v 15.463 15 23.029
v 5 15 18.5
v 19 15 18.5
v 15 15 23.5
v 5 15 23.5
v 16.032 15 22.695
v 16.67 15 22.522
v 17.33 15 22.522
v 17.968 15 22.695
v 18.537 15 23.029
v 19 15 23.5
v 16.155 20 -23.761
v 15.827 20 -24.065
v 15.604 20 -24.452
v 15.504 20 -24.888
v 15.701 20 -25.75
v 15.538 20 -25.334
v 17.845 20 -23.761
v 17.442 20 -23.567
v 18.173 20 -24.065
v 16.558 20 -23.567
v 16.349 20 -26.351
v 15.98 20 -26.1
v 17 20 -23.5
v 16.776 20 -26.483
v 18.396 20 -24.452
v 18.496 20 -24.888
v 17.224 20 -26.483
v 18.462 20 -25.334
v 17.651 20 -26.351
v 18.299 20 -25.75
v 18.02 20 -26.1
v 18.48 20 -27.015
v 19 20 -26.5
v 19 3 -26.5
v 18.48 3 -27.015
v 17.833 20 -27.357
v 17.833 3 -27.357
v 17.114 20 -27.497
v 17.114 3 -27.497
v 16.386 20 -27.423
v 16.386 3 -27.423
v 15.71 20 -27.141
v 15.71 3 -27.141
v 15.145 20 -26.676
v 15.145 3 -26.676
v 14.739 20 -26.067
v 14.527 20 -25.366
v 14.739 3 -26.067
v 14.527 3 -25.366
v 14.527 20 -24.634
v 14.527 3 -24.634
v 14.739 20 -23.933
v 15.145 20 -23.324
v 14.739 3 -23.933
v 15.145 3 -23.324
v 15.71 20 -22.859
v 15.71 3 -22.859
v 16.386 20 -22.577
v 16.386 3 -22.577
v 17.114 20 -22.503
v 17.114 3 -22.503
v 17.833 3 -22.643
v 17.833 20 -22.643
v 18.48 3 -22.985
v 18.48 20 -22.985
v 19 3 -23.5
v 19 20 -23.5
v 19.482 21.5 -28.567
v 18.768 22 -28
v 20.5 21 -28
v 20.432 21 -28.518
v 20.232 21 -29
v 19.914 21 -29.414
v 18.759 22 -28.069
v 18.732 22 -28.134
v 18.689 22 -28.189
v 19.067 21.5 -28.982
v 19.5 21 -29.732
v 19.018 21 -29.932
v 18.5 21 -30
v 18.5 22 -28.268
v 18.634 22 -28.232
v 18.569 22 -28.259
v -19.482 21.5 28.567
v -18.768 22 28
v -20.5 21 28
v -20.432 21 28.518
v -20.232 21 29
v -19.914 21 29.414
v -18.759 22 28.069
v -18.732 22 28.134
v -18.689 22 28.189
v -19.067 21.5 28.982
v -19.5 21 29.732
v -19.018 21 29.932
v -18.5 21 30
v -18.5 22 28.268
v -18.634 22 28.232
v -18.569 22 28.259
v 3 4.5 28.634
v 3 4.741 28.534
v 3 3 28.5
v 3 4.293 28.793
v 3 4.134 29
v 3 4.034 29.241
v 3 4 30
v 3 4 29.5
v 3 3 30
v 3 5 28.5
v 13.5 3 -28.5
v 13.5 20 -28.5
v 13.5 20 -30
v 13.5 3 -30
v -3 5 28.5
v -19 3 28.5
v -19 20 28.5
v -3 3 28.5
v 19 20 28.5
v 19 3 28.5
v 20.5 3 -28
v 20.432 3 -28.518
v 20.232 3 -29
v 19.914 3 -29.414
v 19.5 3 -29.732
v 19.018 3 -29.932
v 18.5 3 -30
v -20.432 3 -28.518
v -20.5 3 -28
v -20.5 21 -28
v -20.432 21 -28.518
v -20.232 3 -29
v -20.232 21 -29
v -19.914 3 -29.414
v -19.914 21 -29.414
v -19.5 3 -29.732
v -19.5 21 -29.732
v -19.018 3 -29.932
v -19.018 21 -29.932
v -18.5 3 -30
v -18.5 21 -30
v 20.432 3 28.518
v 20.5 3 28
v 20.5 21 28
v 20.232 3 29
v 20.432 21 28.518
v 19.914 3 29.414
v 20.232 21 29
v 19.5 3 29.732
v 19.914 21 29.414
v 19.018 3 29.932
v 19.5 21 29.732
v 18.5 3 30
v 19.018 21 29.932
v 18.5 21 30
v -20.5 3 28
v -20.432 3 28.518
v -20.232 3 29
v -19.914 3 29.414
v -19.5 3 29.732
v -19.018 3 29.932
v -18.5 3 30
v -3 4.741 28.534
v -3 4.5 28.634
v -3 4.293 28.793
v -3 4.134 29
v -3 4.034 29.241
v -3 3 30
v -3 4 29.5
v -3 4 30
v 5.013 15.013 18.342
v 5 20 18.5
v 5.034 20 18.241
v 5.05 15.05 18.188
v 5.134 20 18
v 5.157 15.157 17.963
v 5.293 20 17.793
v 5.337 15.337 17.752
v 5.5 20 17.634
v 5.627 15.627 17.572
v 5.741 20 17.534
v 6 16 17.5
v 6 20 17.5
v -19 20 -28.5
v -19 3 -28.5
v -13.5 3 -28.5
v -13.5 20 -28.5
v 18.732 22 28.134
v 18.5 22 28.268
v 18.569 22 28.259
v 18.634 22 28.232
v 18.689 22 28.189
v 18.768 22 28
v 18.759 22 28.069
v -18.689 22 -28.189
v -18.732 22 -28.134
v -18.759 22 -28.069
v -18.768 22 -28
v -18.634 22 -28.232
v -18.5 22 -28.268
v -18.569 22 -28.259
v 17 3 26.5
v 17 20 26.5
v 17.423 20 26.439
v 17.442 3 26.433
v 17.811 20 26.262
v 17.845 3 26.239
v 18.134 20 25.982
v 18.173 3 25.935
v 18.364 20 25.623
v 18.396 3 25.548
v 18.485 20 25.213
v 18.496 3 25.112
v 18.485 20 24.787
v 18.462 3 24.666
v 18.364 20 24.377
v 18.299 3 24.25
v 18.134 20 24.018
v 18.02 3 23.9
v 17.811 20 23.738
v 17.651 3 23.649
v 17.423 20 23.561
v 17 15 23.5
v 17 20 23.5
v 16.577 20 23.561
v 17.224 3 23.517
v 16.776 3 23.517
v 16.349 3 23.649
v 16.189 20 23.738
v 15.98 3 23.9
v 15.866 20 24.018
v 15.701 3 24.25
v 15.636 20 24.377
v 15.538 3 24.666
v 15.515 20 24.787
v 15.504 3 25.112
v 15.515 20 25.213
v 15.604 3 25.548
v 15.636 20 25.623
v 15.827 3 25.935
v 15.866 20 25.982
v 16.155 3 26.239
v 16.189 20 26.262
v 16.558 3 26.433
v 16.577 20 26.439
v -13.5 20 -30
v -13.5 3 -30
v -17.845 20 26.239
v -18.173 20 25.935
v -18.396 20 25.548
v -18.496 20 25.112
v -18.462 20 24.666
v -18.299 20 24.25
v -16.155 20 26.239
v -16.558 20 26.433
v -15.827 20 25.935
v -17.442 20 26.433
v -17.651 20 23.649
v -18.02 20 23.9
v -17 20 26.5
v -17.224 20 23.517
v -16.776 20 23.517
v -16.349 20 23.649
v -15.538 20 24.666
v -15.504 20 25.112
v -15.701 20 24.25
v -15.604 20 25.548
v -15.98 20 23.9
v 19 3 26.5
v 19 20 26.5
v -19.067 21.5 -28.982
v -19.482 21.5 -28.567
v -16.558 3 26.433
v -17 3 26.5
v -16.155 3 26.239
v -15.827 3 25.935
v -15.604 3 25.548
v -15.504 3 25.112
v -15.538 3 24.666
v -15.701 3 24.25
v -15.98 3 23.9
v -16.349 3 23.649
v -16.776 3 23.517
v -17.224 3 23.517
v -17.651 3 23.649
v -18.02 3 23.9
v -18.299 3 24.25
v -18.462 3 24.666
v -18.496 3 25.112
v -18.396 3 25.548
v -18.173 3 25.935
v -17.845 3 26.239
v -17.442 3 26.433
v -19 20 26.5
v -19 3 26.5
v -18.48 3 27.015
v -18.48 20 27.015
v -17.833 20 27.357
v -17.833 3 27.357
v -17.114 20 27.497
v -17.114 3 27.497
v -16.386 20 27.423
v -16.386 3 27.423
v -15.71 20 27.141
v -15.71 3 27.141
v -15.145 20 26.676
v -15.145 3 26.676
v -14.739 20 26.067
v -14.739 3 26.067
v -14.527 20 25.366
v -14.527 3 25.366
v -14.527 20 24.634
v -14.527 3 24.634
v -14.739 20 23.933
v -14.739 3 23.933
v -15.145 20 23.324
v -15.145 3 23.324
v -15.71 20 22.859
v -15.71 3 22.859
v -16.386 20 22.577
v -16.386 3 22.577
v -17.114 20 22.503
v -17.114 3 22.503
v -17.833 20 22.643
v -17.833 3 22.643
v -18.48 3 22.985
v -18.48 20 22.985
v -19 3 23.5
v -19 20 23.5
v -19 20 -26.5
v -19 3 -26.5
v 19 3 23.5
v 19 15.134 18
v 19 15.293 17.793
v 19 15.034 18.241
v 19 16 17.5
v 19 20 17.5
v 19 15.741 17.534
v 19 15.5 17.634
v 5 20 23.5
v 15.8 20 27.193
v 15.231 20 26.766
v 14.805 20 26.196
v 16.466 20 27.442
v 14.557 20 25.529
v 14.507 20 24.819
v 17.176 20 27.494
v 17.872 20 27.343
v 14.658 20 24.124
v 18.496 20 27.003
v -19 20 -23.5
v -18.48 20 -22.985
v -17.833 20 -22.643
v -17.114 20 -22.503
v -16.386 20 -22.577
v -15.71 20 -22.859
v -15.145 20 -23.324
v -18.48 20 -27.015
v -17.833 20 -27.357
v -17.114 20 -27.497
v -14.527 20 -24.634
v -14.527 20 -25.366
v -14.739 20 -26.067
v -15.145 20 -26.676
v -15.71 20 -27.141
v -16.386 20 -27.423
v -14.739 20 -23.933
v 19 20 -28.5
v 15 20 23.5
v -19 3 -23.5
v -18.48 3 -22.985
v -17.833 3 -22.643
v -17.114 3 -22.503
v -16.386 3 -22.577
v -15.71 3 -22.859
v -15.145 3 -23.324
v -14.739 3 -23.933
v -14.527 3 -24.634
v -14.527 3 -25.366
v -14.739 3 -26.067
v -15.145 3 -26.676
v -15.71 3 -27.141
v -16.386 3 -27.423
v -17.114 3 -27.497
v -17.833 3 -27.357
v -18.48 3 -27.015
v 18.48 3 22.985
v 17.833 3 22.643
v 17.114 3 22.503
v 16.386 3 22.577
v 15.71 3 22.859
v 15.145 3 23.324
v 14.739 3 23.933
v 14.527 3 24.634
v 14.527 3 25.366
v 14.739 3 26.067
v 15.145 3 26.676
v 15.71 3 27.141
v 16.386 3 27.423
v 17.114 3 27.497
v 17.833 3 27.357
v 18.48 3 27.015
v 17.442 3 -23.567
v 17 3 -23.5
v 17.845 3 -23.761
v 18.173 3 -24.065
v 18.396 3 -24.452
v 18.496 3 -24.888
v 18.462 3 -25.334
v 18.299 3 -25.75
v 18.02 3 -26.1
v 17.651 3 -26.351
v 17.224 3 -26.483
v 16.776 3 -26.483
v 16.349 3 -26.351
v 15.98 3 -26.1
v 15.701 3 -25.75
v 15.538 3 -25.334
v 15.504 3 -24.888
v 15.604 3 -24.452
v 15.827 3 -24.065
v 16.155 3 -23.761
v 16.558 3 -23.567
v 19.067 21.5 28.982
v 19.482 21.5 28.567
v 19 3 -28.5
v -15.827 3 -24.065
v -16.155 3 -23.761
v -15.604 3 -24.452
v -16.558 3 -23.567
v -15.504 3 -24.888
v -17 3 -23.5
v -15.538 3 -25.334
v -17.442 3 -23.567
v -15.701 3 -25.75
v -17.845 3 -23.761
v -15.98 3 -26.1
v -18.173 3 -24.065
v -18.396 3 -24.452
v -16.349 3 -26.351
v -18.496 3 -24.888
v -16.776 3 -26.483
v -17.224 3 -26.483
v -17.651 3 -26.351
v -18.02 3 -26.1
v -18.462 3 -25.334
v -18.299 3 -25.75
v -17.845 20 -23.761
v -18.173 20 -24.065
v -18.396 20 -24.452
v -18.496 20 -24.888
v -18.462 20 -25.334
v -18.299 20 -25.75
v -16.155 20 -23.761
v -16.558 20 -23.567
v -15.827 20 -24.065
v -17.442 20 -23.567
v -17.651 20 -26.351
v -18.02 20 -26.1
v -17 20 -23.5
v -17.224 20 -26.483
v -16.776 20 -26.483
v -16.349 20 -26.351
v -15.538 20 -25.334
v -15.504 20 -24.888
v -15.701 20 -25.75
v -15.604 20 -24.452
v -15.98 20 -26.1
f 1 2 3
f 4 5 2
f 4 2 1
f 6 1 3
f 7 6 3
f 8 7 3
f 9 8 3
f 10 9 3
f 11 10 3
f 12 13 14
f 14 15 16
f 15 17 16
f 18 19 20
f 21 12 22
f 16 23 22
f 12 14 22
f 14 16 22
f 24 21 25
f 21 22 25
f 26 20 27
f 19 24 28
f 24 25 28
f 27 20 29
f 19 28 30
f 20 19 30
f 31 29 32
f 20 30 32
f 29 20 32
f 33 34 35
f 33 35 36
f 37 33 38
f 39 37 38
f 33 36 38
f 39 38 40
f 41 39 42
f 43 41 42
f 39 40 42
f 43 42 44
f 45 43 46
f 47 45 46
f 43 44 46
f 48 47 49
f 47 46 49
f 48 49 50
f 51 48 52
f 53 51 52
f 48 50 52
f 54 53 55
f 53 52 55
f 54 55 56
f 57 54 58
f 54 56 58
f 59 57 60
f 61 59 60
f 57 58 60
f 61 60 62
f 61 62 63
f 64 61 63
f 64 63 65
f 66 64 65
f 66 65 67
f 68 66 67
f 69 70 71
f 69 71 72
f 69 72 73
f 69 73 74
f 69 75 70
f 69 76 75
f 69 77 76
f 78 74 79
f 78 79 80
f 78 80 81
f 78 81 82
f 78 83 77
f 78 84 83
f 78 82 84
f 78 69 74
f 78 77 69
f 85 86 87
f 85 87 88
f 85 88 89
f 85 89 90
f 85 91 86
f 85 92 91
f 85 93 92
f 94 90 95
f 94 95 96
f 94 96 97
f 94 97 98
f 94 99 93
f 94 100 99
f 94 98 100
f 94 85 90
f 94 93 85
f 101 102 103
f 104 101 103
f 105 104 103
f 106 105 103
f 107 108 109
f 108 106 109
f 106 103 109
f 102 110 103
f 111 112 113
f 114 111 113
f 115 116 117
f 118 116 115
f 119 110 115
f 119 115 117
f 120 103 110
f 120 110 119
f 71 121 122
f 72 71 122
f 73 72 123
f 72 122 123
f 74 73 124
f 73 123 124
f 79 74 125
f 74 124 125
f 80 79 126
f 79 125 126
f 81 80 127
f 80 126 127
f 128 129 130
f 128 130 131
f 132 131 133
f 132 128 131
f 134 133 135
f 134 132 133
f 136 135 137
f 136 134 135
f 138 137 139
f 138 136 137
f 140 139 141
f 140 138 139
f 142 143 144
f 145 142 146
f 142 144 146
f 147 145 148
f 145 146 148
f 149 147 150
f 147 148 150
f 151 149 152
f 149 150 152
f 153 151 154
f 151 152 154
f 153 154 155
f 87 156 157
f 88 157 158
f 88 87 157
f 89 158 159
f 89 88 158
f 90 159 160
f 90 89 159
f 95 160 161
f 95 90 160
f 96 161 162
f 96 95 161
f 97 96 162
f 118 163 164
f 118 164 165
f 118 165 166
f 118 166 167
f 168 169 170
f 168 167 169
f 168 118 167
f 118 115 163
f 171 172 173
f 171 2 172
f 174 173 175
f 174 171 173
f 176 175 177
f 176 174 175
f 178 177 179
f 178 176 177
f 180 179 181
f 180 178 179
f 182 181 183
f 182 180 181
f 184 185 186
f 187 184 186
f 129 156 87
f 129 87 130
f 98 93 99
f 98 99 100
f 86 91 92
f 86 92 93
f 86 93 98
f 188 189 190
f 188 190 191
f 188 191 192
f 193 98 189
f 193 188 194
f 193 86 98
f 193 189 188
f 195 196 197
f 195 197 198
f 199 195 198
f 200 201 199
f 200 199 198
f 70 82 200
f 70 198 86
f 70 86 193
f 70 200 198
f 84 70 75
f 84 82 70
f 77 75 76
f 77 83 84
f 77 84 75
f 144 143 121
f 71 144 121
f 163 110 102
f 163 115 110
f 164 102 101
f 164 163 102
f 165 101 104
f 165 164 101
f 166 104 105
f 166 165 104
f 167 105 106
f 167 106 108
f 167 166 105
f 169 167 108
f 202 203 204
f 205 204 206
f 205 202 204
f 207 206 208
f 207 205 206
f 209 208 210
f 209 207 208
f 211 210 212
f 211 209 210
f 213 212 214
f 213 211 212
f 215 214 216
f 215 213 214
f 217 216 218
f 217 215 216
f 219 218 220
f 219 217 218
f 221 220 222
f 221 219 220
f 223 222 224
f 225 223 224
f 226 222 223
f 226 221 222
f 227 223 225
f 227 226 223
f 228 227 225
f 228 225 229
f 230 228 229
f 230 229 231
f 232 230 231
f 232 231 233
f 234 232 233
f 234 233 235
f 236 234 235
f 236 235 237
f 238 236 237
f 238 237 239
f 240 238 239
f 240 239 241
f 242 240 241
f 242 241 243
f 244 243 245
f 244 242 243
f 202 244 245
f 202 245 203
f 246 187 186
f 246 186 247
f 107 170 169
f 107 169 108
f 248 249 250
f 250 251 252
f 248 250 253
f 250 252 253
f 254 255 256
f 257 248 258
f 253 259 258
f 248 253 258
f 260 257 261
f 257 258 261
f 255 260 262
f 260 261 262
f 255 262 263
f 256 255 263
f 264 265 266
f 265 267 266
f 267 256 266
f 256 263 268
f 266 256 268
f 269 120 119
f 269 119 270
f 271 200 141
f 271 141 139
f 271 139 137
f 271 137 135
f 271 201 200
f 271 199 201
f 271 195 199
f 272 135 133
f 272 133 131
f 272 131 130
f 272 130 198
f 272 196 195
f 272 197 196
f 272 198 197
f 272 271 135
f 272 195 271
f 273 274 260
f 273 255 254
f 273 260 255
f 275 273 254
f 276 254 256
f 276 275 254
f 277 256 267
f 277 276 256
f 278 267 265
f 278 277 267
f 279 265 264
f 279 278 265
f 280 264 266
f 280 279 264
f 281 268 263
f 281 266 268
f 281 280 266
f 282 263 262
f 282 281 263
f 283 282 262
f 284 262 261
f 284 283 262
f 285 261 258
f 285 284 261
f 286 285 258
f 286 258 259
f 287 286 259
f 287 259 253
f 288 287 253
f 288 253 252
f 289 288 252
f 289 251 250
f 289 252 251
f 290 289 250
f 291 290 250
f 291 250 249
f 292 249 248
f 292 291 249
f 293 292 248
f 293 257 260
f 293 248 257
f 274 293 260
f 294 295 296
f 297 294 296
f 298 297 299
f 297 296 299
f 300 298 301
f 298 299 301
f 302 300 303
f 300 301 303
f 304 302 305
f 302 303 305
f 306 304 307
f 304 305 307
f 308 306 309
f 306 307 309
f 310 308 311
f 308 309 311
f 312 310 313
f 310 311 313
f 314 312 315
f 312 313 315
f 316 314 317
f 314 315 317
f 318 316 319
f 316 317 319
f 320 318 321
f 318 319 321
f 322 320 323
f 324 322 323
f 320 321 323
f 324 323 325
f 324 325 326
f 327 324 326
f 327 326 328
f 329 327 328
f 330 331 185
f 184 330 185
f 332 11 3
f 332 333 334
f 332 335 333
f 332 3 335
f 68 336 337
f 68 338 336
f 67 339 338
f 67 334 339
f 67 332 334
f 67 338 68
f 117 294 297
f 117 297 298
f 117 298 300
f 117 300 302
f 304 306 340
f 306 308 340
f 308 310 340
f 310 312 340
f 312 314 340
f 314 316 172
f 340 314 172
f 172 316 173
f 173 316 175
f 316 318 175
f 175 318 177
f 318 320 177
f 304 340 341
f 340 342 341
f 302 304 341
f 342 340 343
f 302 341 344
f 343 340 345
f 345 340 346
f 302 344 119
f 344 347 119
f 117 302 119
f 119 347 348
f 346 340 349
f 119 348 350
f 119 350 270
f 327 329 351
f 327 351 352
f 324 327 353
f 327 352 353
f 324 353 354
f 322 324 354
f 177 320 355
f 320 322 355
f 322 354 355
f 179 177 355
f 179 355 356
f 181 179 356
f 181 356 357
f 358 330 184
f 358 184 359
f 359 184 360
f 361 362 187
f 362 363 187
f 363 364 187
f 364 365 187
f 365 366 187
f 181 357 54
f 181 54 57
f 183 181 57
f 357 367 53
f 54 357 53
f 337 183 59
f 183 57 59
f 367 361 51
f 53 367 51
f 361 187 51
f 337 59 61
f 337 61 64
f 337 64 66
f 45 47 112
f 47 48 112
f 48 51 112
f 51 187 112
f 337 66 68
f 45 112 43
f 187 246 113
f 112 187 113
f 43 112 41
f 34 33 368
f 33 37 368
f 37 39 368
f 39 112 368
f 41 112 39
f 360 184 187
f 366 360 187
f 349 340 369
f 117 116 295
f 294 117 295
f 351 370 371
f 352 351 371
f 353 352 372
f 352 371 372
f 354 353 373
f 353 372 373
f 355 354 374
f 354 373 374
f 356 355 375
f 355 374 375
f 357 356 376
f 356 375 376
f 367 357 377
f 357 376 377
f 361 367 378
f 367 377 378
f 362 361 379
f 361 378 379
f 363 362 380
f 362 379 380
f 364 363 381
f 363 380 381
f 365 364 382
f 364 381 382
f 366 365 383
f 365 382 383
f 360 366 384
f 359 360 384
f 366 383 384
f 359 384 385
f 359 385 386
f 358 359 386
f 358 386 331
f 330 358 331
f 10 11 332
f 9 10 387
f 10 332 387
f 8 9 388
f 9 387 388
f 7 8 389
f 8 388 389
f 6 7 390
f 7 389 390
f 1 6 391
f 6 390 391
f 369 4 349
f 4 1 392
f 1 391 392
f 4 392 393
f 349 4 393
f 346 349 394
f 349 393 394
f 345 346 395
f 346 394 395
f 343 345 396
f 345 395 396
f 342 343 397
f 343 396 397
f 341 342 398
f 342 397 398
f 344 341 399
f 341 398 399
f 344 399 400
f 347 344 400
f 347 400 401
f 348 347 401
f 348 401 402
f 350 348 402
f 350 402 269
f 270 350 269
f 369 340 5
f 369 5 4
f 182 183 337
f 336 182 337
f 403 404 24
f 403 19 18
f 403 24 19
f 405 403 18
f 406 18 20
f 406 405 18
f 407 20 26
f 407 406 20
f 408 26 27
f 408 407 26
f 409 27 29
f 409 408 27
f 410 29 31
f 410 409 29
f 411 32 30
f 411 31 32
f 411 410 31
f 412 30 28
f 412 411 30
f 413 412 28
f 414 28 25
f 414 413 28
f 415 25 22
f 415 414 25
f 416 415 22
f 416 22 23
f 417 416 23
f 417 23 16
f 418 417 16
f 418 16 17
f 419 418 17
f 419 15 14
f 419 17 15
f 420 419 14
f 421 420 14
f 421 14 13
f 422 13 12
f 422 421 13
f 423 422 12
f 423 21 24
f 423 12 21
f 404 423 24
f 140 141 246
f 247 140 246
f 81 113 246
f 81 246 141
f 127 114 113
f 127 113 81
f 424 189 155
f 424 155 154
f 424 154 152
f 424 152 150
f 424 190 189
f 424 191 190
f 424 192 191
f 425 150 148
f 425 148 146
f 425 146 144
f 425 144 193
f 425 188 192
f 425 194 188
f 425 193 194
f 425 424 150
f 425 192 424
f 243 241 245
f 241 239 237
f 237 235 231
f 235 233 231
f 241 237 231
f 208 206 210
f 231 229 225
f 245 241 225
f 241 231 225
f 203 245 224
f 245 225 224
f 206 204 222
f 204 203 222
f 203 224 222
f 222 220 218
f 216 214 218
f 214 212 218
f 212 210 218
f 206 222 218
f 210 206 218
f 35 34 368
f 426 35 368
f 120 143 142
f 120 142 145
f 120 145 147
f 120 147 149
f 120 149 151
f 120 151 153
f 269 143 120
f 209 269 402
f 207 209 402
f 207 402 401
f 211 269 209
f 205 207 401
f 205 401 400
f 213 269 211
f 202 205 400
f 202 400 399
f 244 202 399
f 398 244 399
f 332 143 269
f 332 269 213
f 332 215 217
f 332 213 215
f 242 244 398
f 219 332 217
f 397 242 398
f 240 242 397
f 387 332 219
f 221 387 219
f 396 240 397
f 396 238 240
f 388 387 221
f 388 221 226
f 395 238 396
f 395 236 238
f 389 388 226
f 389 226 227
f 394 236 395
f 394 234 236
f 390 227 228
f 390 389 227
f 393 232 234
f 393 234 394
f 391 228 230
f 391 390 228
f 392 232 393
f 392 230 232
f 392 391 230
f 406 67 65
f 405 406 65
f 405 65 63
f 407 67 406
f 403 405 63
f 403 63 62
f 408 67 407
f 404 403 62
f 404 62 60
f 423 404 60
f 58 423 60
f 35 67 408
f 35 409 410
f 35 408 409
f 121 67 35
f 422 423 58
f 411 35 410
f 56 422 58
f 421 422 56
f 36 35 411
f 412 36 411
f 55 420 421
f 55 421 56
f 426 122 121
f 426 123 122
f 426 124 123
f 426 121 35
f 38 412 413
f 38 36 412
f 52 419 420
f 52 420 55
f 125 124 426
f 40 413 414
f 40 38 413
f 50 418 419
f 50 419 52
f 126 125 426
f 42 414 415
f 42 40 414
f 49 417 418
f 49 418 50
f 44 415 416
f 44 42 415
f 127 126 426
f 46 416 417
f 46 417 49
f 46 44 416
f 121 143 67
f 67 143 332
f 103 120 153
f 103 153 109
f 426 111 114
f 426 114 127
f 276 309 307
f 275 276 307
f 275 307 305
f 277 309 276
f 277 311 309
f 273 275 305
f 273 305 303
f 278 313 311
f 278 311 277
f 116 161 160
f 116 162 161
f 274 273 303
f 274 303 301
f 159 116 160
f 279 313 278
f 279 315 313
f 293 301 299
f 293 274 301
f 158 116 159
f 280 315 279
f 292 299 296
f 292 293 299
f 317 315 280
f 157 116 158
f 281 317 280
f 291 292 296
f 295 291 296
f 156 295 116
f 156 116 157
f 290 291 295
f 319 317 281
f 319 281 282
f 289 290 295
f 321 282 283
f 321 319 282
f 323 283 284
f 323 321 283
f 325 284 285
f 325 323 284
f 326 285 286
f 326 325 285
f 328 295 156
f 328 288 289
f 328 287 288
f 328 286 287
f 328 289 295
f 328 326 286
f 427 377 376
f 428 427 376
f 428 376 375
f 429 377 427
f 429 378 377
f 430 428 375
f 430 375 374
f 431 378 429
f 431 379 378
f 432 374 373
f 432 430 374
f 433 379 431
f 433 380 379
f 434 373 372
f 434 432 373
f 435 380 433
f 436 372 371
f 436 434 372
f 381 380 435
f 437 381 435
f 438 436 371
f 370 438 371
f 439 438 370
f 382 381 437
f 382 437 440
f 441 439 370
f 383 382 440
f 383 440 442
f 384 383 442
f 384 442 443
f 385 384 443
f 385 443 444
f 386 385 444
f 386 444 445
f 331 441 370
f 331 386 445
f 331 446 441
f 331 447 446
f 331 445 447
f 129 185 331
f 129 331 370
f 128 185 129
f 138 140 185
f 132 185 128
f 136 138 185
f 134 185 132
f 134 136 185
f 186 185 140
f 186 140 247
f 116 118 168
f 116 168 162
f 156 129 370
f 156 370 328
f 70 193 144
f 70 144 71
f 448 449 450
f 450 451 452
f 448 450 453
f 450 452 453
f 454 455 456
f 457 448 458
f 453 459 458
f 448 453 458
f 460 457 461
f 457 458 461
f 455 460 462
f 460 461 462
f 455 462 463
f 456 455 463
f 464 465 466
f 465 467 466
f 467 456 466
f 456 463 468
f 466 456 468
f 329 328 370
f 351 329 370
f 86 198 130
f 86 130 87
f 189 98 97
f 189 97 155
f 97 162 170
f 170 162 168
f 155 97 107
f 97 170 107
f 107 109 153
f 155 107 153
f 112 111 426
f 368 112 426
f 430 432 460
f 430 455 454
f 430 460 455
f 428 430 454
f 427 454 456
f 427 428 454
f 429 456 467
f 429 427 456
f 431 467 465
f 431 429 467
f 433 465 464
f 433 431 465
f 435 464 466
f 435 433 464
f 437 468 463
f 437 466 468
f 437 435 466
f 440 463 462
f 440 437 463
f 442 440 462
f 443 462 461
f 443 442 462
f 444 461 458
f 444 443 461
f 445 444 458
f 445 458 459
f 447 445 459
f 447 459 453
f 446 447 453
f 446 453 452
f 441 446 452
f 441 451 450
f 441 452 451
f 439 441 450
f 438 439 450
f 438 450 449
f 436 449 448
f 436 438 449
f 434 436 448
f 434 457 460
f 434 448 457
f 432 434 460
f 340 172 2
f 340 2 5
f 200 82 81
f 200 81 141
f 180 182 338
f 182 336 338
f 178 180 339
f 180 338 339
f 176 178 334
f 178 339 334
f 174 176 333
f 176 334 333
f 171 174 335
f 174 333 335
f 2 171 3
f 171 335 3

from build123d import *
from OCP.BRepFilletAPI import BRepFilletAPI_MakeChamfer

# Parameters (mm, degrees)
SKETCH_1_W               = 41
SKETCH_1_H               = 60
EXTRUDE_1_DEPTH          = 3
SKETCH_2_W               = 41
SKETCH_2_H               = 60
SKETCH_2_W_2             = 38
SKETCH_2_H_2             = 57
EXTRUDE_1_2_DEPTH        = 17
SKETCH_3_W               = 27
SKETCH_3_H               = 3.030341357
CUT_EXTRUDE_1_DEPTH      = 17
SKETCH_4_R               = 2.5
EXTRUDE_2_DEPTH          = 17
CUT_EXTRUDE_2_DEPTH      = 42.475896615
CUT_EXTRUDE_2_DEPTH_BACK = 42.475896615
SKETCH_5_R               = 1.5
SKETCH_9_W               = 41
SKETCH_9_H               = 3
CUT_EXTRUDE_3_DEPTH      = 67.484960705
SKETCH_10_W              = 41
SKETCH_10_H              = 60
EXTRUDE_4_DEPTH          = 2
SKETCH_11_W              = 6
SKETCH_11_H              = 3.013062302
CUT_EXTRUDE_4_DEPTH      = 1
SKETCH_12_W              = 14
SKETCH_12_H              = 6
EXTRUDE_6_DEPTH          = 5
FILLET_2_R               = 1
FILLET_3_R               = 1
FILLET_4_R               = 2
CHAMFER_2_SIZE           = 1
CHAMFER_2_SIZE2          = 1.732050808


with BuildPart() as part:
    # Эскиз1 → Extrude 1 (new body)
    with BuildSketch(Plane(origin=(0, 0, 0), x_dir=(1, 0, 0), z_dir=(0, 1, 0))):
        Rectangle(SKETCH_1_W, SKETCH_1_H)
    extrude(amount=EXTRUDE_1_DEPTH)

    # Эскиз2 → Extrude 1 2 (add)
    with BuildSketch(Plane(origin=(0, 3, 0), x_dir=(1, 0, 0), z_dir=(0, 1, 0))):
        Rectangle(SKETCH_2_W, SKETCH_2_H)
        Rectangle(SKETCH_2_W_2, SKETCH_2_H_2, mode=Mode.SUBTRACT)
    extrude(amount=EXTRUDE_1_2_DEPTH)

    # Эскиз3 → Вырез-Вытянуть1 (cut)
    with BuildSketch(Plane(origin=(0, 20, 0), x_dir=(1, 0, 0), z_dir=(0, 1, 0))):
        with Locations((0, 29.478101209)):
            Rectangle(SKETCH_3_W, SKETCH_3_H)
    extrude(amount=-CUT_EXTRUDE_1_DEPTH, mode=Mode.SUBTRACT)

    # Эскиз4 → Бобышка-Вытянуть2 (add)
    with BuildSketch(Plane(origin=(0, 3, 0), x_dir=(1, 0, 0), z_dir=(0, 1, 0))):
        with Locations((17, 25)):
            Circle(SKETCH_4_R)
        with Locations((-17, 25)):
            Circle(SKETCH_4_R)
        with Locations((17, -25)):
            Circle(SKETCH_4_R)
        with Locations((-17, -25)):
            Circle(SKETCH_4_R)
    extrude(amount=EXTRUDE_2_DEPTH)

    # Эскиз5 → Вырез-Вытянуть2 (cut, two sides: drawn at the far end of the back side and taken through both)
    with BuildSketch(Plane(origin=(0, 20, 0), x_dir=(1, 0, 0), z_dir=(0, 1, 0)).offset(-CUT_EXTRUDE_2_DEPTH_BACK)):
        with Locations(Location((17, 25, 0), (0, 0, 270))):
            Circle(SKETCH_5_R)
        with Locations(Location((17, -25, 0), (0, 0, 270))):
            Circle(SKETCH_5_R)
        with Locations(Location((-17, -25, 0), (0, 0, 270))):
            Circle(SKETCH_5_R)
        with Locations(Location((-17, 25, 0), (0, 0, 270))):
            Circle(SKETCH_5_R)
    extrude(amount=CUT_EXTRUDE_2_DEPTH + CUT_EXTRUDE_2_DEPTH_BACK, mode=Mode.SUBTRACT)

    # Эскиз9 → Вырез-Вытянуть3 (cut, through all)
    with BuildSketch(Plane(origin=(0, 0, -30), x_dir=(-1, 0, 0), z_dir=(0, 0, -1))):
        with Locations((0, 1.5)):
            Rectangle(SKETCH_9_W, SKETCH_9_H)
    extrude(amount=-CUT_EXTRUDE_3_DEPTH, mode=Mode.SUBTRACT)

    # Эскиз10 → Бобышка-Вытянуть4 (add)
    with BuildSketch(Plane(origin=(0, 20, 0), x_dir=(1, 0, 0), z_dir=(0, 1, 0))):
        Rectangle(SKETCH_10_W, SKETCH_10_H)
    extrude(amount=EXTRUDE_4_DEPTH)

    # Эскиз11 → Вырез-Вытянуть4 (cut)
    with BuildSketch(Plane.XZ.offset(-3)):
        with Locations((0, 29.353335514)):
            Rectangle(SKETCH_11_W, SKETCH_11_H)
    extrude(amount=-CUT_EXTRUDE_4_DEPTH, mode=Mode.SUBTRACT)

    # Эскиз12 → Бобышка-Вытянуть6 (add)
    with BuildSketch(Plane.XZ.offset(-20)):
        with Locations((12, 20.5)):
            Rectangle(SKETCH_12_W, SKETCH_12_H)
    extrude(amount=EXTRUDE_6_DEPTH)

    # Скругление2
    fillet_2_edges = [part.edges().sort_by_distance(p)[0] for p in [
        (12, 15, 17.5),
        (5, 17.5, 17.5),
    ]]
    fillet(fillet_2_edges, radius=FILLET_2_R)

    # Скругление3
    fillet_3_edges = [part.edges().sort_by_distance(p)[0] for p in [
        (0, 4, 28.5),
    ]]
    fillet(fillet_3_edges, radius=FILLET_3_R)

    # Скругление4
    fillet_4_edges = [part.edges().sort_by_distance(p)[0] for p in [
        (20.5, 12.5, 30),
        (-20.5, 12.5, 30),
        (-20.5, 12.5, -30),
        (20.5, 12.5, -30),
    ]]
    fillet(fillet_4_edges, radius=FILLET_4_R)

    # Фаска2: one chamfer whose edges measure the first distance from different faces: ONE call of the kernel's chamfer builder (chamfer() names one face for all edges)
    chamfer_2_edges_1 = [part.edges().sort_by_distance(p)[0] for p in [
        (20.5, 22, 0),
    ]]
    chamfer_2_side_1 = [part.faces().sort_by_distance(p)[0] for p in [
        (20.5, 12.5, 0),
    ]]
    chamfer_2_edges_2 = [part.edges().sort_by_distance(p)[0] for p in [
        (0, 22, 30),
    ]]
    chamfer_2_side_2 = [part.faces().sort_by_distance(p)[0] for p in [
        (0, 12.577474892, 30),
    ]]
    chamfer_2_edges_3 = [part.edges().sort_by_distance(p)[0] for p in [
        (-20.5, 22, 0),
    ]]
    chamfer_2_side_3 = [part.faces().sort_by_distance(p)[0] for p in [
        (-20.5, 12.5, 0),
    ]]
    chamfer_2_edges_4 = [part.edges().sort_by_distance(p)[0] for p in [
        (0, 22, -30),
    ]]
    chamfer_2_side_4 = [part.faces().sort_by_distance(p)[0] for p in [
        (-16, 3.415932687, -30),
    ]]
    chamfer_2_edges_5 = [part.edges().sort_by_distance(p)[0] for p in [
        (-19.914213562, 22, 29.414213562),
    ]]
    chamfer_2_side_5 = [part.faces().sort_by_distance(p)[0] for p in [
        (-19.914213562, 12.5, 29.414213562),
    ]]
    chamfer_2_edges_6 = [part.edges().sort_by_distance(p)[0] for p in [
        (-19.914213562, 22, -29.414213562),
    ]]
    chamfer_2_side_6 = [part.faces().sort_by_distance(p)[0] for p in [
        (-19.914213562, 12.5, -29.414213562),
    ]]
    chamfer_2_edges_7 = [part.edges().sort_by_distance(p)[0] for p in [
        (19.914213562, 22, -29.414213562),
    ]]
    chamfer_2_side_7 = [part.faces().sort_by_distance(p)[0] for p in [
        (19.914213562, 12.5, -29.414213562),
    ]]
    chamfer_2_edges_8 = [part.edges().sort_by_distance(p)[0] for p in [
        (19.914213562, 22, 29.414213562),
    ]]
    chamfer_2_side_8 = [part.faces().sort_by_distance(p)[0] for p in [
        (19.914213562, 12.5, 29.414213562),
    ]]
    chamfer_2 = BRepFilletAPI_MakeChamfer(part.part.solid().wrapped)
    for e in chamfer_2_edges_1:
        chamfer_2.Add(CHAMFER_2_SIZE, CHAMFER_2_SIZE2, e.wrapped, chamfer_2_side_1[0].wrapped)  # the first distance lies on this face
    for e in chamfer_2_edges_2:
        chamfer_2.Add(CHAMFER_2_SIZE, CHAMFER_2_SIZE2, e.wrapped, chamfer_2_side_2[0].wrapped)  # the first distance lies on this face
    for e in chamfer_2_edges_3:
        chamfer_2.Add(CHAMFER_2_SIZE, CHAMFER_2_SIZE2, e.wrapped, chamfer_2_side_3[0].wrapped)  # the first distance lies on this face
    for e in chamfer_2_edges_4:
        chamfer_2.Add(CHAMFER_2_SIZE, CHAMFER_2_SIZE2, e.wrapped, chamfer_2_side_4[0].wrapped)  # the first distance lies on this face
    for e in chamfer_2_edges_5:
        chamfer_2.Add(CHAMFER_2_SIZE, CHAMFER_2_SIZE2, e.wrapped, chamfer_2_side_5[0].wrapped)  # the first distance lies on this face
    for e in chamfer_2_edges_6:
        chamfer_2.Add(CHAMFER_2_SIZE, CHAMFER_2_SIZE2, e.wrapped, chamfer_2_side_6[0].wrapped)  # the first distance lies on this face
    for e in chamfer_2_edges_7:
        chamfer_2.Add(CHAMFER_2_SIZE, CHAMFER_2_SIZE2, e.wrapped, chamfer_2_side_7[0].wrapped)  # the first distance lies on this face
    for e in chamfer_2_edges_8:
        chamfer_2.Add(CHAMFER_2_SIZE, CHAMFER_2_SIZE2, e.wrapped, chamfer_2_side_8[0].wrapped)  # the first distance lies on this face
    add(Compound.cast(chamfer_2.Shape()), mode=Mode.REPLACE)


solid = part.part
